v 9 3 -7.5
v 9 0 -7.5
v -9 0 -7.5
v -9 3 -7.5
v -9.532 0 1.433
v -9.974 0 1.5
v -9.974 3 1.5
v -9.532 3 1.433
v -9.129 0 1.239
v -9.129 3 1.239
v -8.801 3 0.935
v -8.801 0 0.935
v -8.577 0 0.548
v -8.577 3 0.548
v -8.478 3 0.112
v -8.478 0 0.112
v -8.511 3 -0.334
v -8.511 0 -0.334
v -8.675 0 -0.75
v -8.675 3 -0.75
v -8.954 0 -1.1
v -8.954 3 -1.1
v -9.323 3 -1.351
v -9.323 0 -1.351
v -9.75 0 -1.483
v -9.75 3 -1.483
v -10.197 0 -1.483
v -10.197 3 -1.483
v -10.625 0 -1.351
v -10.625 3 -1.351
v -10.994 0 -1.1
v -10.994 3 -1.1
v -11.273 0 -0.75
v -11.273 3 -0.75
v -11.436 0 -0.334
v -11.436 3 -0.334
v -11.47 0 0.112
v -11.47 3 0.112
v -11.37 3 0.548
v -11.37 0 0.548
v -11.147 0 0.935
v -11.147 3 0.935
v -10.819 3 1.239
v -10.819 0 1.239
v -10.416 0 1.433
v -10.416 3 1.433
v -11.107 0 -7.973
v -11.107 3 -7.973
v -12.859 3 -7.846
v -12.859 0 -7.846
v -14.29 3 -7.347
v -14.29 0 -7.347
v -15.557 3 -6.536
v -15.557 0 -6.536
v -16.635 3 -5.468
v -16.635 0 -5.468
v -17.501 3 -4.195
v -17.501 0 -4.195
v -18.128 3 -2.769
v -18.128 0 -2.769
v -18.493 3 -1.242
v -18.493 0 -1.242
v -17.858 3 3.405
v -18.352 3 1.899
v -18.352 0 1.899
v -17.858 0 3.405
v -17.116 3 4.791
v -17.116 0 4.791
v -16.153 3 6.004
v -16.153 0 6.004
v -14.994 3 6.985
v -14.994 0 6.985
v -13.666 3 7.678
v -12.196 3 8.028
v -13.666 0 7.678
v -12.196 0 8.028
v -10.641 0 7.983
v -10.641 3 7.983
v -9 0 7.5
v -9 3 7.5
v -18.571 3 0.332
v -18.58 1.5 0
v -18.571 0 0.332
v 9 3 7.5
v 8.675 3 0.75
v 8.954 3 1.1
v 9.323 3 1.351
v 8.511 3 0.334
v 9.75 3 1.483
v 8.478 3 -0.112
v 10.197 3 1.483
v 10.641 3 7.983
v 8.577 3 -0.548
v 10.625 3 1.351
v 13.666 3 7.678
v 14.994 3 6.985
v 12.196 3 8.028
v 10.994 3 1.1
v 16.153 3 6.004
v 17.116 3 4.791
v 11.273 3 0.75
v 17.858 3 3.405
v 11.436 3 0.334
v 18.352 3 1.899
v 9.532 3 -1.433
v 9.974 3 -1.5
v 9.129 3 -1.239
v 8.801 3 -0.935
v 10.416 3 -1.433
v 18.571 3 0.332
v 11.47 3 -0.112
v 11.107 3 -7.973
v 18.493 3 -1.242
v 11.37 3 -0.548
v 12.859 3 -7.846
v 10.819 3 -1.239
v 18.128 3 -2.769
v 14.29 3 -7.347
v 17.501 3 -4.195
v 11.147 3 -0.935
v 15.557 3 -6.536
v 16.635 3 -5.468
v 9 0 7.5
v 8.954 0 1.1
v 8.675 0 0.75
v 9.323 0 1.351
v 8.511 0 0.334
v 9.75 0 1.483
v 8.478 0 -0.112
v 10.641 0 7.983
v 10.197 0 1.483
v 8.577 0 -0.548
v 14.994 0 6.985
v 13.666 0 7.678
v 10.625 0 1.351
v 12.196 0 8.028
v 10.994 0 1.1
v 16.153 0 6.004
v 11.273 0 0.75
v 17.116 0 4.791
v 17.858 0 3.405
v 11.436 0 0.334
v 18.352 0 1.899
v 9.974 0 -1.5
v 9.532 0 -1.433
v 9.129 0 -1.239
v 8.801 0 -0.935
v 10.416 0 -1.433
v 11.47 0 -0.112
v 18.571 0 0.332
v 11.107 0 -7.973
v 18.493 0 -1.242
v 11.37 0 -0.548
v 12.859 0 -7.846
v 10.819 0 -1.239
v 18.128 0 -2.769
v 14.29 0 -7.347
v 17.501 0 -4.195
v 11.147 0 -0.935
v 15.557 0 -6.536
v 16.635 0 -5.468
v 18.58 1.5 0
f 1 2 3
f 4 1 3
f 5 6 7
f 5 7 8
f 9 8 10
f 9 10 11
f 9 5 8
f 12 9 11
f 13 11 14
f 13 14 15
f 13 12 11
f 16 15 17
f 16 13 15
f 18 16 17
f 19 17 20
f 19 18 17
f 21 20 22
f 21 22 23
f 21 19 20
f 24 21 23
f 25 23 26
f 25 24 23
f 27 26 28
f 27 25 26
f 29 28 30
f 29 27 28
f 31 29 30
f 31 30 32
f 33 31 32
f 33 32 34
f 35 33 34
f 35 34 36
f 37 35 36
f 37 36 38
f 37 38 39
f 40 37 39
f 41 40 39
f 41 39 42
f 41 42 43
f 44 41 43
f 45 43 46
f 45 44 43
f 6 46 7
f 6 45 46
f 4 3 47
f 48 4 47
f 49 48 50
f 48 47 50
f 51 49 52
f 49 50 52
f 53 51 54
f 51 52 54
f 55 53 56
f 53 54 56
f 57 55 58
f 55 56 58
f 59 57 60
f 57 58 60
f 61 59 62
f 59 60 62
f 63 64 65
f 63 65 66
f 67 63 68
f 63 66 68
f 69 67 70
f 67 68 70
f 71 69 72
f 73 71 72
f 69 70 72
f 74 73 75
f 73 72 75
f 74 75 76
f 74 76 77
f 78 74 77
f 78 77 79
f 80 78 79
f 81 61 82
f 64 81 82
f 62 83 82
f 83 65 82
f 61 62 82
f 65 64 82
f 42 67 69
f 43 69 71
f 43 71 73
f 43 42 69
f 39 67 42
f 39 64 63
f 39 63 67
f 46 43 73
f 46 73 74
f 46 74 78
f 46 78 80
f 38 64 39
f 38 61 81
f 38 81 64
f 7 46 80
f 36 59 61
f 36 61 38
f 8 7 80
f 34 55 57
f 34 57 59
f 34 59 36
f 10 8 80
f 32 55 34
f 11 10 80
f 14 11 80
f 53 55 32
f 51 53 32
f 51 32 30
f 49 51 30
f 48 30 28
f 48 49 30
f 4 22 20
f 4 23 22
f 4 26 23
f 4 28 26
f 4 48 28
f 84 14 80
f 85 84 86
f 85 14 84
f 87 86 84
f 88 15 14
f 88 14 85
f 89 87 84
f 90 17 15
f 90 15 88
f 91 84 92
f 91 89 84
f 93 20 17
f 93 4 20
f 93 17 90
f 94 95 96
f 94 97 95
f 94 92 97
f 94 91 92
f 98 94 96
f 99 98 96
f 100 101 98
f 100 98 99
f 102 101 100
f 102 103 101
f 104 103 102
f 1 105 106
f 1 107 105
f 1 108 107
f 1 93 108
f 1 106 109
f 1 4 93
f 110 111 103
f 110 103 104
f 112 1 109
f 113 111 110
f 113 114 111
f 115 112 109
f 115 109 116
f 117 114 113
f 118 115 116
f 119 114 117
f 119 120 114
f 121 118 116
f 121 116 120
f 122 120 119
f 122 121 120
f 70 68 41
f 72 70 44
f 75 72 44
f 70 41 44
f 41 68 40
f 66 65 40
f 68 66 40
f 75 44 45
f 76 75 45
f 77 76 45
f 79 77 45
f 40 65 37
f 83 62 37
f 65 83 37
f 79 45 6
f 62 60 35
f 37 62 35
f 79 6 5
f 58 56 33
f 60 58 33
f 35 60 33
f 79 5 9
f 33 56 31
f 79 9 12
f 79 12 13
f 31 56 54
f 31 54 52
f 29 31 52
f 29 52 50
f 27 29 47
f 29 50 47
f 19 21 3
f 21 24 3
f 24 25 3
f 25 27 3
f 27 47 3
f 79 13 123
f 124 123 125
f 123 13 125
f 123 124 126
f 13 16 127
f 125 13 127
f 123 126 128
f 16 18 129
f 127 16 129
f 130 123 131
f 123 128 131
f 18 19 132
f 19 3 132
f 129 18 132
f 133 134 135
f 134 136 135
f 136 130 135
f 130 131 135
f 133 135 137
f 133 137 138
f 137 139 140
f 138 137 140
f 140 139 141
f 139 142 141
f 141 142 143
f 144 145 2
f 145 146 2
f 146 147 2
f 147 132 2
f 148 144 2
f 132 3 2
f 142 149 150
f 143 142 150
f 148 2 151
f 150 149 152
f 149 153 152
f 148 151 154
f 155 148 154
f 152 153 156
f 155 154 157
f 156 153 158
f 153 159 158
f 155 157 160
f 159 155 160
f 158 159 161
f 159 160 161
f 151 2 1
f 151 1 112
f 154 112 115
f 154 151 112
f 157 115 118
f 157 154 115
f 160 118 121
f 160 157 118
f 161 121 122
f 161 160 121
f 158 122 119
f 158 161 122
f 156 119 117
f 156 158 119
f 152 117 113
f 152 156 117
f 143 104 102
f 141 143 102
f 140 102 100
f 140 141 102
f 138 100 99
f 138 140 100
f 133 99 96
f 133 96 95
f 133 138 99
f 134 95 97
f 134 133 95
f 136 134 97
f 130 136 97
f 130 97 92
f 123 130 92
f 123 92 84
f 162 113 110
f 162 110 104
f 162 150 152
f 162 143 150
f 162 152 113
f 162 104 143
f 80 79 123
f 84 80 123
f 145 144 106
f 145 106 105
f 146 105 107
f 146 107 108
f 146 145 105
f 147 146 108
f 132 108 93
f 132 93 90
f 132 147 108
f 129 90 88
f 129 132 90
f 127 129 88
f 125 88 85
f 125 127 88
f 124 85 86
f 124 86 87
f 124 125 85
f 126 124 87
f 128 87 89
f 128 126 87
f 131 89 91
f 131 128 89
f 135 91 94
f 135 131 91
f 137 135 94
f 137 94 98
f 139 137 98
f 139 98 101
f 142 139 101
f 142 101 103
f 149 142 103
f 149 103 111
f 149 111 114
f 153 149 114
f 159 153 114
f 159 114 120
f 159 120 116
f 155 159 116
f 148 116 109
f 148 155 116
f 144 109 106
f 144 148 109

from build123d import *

# Parameters (mm, degrees)
ESQUISSE2_R        = 1.5
BOSS_EXTRU_1_DEPTH = 3


with BuildPart() as part:
    # Esquisse2 → Boss.-Extru.1 (new body)
    with BuildSketch(Plane(origin=(0, 0, 0), x_dir=(1, 0, 0), z_dir=(0, 1, 0))):
        with BuildLine():
            Line((9, 7.5), (-9, 7.5))
            add(Edge.make_bspline(
                [(-9, 7.5), (-14.368679203, 9.540675776), (-22.864046294, 0.062993), (-14.222464977, -9.74400485), (-9, -7.5)],
                knots=[0, 0, 0, 0, 0.498997334, 1, 1, 1, 1], degree=3))
            Line((-9, -7.5), (9, -7.5))
            add(Edge.make_bspline(
                [(9, 7.5), (14.368679203, 9.540675776), (22.864046294, 0.062993), (14.222464977, -9.74400485), (9, -7.5)],
                knots=[0, 0, 0, 0, 0.498997334, 1, 1, 1, 1], degree=3))
        make_face()
        with Locations(Location((-9.973759583, 0, 0), (0, 0, 270))):
            Circle(ESQUISSE2_R, mode=Mode.SUBTRACT)
        with Locations(Location((9.973759583, 0, 0), (0, 0, 90))):
            Circle(ESQUISSE2_R, mode=Mode.SUBTRACT)
    extrude(amount=BOSS_EXTRU_1_DEPTH)


solid = part.part
